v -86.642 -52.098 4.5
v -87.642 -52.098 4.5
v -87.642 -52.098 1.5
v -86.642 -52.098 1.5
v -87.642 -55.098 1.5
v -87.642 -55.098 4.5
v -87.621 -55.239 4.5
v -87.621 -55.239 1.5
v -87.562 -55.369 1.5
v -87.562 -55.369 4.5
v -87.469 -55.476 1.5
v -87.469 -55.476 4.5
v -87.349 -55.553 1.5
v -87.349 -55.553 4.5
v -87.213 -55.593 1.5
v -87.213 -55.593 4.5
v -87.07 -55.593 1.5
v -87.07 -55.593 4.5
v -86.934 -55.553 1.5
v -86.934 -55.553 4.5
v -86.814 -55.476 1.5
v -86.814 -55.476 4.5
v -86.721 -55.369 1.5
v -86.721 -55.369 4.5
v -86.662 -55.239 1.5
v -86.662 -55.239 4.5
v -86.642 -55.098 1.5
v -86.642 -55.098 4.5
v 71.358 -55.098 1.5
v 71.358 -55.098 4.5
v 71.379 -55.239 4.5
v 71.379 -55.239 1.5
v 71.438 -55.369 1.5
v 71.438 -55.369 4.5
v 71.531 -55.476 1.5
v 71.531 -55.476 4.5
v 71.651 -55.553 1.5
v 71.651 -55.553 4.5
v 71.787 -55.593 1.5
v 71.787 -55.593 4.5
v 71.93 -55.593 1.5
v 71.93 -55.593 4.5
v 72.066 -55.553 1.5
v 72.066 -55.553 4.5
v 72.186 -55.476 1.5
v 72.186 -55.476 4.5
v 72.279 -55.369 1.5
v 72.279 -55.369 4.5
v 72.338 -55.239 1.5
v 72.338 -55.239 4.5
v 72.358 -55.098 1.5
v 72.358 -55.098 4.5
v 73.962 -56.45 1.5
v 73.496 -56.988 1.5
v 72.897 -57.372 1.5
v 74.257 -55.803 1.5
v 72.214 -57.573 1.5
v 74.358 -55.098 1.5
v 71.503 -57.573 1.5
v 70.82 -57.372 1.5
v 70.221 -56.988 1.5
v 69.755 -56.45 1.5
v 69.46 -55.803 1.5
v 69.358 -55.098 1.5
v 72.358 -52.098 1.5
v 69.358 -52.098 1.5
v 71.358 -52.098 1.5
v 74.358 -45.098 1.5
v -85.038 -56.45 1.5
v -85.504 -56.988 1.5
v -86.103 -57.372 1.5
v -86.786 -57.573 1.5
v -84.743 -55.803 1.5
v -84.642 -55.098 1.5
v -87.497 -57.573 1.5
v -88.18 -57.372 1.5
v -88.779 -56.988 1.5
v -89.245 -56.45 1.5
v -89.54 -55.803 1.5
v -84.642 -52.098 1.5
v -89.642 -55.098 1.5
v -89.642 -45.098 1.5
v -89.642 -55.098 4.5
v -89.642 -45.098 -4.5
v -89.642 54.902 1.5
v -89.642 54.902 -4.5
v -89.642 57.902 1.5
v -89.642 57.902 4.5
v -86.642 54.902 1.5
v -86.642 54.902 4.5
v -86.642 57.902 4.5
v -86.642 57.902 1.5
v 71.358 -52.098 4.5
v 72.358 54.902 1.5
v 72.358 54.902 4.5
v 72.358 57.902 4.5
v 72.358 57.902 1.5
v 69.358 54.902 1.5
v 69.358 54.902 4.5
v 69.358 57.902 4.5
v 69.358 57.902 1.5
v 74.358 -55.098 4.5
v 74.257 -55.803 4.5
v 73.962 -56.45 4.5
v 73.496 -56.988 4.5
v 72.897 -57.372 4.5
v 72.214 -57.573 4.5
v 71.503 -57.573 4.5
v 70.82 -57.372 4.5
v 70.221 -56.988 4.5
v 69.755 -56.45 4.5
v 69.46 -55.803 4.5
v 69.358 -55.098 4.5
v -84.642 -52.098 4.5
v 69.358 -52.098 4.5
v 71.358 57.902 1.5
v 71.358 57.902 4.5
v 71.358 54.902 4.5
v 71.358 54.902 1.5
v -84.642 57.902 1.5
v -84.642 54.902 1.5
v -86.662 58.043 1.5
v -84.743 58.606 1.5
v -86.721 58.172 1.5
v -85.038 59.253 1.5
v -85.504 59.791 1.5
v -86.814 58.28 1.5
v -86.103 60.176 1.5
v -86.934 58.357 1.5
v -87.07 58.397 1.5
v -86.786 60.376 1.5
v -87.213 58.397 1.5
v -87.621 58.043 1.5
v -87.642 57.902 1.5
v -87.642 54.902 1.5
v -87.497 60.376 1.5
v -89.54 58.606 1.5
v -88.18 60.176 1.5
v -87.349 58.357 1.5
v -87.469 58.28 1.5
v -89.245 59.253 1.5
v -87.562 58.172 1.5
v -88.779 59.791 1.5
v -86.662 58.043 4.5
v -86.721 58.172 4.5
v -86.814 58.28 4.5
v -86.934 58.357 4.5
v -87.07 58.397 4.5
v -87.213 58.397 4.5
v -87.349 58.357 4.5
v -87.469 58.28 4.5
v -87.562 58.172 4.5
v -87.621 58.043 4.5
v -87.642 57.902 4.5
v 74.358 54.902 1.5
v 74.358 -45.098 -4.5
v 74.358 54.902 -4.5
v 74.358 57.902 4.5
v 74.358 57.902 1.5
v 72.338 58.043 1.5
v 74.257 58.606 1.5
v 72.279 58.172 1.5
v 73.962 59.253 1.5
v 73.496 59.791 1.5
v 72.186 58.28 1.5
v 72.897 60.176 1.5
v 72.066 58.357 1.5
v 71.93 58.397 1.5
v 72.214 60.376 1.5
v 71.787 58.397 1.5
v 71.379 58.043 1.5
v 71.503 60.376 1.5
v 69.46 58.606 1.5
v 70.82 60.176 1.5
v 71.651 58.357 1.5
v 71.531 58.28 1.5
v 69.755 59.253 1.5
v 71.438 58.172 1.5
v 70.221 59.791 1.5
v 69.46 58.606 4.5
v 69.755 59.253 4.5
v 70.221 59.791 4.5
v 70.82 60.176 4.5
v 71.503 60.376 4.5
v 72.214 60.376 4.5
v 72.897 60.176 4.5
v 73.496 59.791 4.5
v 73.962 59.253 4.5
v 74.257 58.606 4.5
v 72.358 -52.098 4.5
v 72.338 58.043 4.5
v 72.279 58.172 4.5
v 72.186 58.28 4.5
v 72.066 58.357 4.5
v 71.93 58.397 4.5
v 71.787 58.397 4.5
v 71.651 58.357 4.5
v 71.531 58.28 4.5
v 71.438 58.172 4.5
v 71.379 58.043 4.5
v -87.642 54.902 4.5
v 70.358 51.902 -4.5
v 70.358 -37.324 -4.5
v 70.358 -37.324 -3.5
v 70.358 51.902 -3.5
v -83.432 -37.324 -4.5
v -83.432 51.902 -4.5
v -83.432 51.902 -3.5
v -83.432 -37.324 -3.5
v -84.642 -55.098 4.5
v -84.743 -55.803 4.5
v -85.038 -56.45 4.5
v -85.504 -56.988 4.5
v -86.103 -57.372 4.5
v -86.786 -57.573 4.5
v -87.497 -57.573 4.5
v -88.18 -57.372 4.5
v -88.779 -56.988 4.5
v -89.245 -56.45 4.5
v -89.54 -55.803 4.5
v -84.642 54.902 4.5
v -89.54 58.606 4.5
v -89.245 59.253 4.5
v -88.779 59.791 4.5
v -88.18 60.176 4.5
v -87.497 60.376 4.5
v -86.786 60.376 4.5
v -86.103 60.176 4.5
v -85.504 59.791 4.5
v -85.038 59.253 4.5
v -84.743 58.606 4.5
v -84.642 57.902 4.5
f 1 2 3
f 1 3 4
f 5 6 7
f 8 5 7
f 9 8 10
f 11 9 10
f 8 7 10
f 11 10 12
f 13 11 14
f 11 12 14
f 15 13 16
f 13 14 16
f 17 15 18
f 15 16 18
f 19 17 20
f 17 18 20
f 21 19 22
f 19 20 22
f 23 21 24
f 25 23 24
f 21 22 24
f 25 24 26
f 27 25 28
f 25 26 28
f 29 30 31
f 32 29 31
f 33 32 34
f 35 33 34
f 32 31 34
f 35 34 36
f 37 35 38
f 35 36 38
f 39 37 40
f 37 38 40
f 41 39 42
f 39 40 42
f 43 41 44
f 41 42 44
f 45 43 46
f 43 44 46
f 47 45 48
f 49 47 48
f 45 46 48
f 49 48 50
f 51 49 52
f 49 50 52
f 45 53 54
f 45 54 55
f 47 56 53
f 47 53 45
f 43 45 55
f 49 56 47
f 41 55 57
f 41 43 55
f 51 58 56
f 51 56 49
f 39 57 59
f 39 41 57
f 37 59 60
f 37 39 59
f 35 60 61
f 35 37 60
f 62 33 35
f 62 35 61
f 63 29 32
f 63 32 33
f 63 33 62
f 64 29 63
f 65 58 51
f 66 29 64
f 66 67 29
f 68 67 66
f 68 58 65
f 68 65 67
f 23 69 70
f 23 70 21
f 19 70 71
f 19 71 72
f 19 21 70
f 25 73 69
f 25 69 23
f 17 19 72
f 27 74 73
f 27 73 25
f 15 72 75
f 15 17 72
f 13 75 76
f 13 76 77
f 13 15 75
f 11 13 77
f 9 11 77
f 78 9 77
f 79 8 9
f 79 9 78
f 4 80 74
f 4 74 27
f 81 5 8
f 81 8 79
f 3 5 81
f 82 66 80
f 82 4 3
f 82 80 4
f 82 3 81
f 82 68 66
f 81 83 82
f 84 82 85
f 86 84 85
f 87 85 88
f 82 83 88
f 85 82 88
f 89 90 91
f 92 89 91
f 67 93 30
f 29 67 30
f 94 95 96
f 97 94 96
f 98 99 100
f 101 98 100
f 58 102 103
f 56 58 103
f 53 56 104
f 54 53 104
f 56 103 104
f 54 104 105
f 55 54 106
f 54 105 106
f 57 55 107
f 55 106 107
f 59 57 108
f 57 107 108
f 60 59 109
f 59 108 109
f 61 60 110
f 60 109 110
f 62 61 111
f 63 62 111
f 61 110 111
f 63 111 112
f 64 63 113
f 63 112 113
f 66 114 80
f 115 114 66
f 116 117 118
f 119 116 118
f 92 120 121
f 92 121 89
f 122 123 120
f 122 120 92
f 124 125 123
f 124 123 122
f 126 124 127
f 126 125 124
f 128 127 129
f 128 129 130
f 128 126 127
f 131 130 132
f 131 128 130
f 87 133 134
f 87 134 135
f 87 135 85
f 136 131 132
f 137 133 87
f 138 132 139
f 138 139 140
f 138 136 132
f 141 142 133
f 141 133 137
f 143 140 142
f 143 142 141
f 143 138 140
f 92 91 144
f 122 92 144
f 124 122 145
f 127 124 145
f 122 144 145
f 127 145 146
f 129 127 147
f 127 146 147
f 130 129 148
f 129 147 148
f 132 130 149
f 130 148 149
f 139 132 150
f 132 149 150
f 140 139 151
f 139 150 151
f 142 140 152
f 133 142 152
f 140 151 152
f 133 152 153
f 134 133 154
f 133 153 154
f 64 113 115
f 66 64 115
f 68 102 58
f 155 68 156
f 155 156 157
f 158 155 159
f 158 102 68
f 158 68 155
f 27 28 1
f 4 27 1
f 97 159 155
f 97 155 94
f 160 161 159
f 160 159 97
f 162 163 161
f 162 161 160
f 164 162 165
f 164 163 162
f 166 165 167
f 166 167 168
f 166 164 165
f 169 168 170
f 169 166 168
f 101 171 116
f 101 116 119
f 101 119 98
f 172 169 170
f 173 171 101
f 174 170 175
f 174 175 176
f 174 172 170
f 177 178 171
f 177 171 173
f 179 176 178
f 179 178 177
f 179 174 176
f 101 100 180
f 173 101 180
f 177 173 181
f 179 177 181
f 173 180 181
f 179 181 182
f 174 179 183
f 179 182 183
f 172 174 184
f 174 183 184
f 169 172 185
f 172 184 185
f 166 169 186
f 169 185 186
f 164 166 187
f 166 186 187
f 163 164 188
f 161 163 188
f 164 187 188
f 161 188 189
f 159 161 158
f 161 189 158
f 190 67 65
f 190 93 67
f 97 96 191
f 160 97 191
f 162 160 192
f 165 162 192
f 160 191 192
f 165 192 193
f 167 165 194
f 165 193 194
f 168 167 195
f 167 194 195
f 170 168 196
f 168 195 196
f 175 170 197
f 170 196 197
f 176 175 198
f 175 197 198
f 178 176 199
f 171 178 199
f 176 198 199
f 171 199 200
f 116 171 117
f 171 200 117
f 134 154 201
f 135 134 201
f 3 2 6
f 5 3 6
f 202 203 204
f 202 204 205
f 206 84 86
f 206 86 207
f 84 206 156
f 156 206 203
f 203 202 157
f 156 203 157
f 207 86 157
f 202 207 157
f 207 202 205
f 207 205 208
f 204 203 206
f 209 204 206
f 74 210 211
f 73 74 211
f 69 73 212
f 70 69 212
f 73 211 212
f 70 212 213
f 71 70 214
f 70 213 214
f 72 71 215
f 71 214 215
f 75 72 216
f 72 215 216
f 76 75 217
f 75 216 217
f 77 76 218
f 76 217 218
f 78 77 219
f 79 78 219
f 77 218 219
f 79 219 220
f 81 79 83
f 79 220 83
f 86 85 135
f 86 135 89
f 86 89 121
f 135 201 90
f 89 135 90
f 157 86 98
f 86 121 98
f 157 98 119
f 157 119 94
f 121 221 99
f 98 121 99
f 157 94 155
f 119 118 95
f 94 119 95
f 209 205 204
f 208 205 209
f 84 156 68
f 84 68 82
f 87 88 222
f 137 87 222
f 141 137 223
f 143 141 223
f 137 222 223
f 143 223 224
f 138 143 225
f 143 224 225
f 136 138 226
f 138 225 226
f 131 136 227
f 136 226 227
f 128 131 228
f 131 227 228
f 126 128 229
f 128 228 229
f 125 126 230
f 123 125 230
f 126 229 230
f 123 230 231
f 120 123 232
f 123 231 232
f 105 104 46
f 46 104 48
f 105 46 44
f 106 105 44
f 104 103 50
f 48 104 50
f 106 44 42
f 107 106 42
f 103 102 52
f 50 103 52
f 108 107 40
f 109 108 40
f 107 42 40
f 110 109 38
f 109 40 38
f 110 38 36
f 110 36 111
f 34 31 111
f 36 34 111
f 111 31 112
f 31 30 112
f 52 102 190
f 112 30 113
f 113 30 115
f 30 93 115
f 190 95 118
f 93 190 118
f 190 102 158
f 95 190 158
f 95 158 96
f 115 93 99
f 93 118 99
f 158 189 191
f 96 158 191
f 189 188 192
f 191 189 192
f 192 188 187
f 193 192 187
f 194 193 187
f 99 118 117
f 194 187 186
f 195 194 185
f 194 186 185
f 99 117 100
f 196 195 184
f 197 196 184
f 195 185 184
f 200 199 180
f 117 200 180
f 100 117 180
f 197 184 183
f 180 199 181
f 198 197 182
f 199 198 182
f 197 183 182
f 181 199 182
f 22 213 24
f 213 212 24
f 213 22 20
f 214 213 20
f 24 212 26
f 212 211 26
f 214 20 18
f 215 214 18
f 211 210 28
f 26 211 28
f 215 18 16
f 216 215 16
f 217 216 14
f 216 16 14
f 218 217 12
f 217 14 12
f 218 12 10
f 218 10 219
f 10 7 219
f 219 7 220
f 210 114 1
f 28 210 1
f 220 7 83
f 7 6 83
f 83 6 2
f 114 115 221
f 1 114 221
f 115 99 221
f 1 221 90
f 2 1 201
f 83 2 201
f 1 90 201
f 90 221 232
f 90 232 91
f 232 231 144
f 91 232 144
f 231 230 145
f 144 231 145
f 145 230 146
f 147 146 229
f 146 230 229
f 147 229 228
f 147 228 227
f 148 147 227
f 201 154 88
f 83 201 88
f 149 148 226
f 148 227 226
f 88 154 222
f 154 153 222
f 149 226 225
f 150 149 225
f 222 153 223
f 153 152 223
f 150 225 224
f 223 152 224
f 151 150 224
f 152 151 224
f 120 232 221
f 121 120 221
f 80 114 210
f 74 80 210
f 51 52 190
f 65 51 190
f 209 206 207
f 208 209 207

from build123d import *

# Parameters (mm, degrees)
ESBO_O1_W                = 164
ESBO_O1_H                = 107
RESSALTO_EXTRUS_O1_DEPTH = 4.5
EXTRUS_O_FINA2_DEPTH     = 3
ESBO_O3_W                = 164
ESBO_O3_H                = 7
CORTE_EXTRUS_O1_DEPTH    = 6
ESBO_O5_W                = 153.790549152
ESBO_O5_H                = 89.226156431
CORTE_EXTRUS_O2_DEPTH    = 1


with BuildPart() as part:
    # Esboço1 → Ressalto-extrusão1 (new, symmetric)
    with BuildSketch(Plane.XY):
        with Locations((-7.64158605, 1.401746725)):
            Rectangle(ESBO_O1_W, ESBO_O1_H)
    extrude(amount=RESSALTO_EXTRUS_O1_DEPTH, both=True)

    # Esboço2 → Extrusão-Fina2 (add)
    with BuildSketch(Plane.XY.offset(4.5)):
        with BuildLine():
            Line((-89.64158605, 54.901746725), (-89.64158605, 57.901746725))
            ThreePointArc((-89.64158605, 57.901746725), (-87.14158605, 60.401746725), (-84.64158605, 57.901746725))
            Line((-84.64158605, 57.901746725), (-84.64158605, 54.901746725))
            Line((-84.64158605, 54.901746725), (-86.64158605, 54.901746725))
            Line((-86.64158605, 54.901746725), (-86.64158605, 57.901746725))
            ThreePointArc((-86.64158605, 57.901746725), (-87.14158605, 58.401746725), (-87.64158605, 57.901746725))
            Line((-87.64158605, 57.901746725), (-87.64158605, 54.901746725))
            Line((-87.64158605, 54.901746725), (-89.64158605, 54.901746725))
        make_face()
        with BuildLine():
            Line((69.35841395, 54.901746725), (69.35841395, 57.901746725))
            ThreePointArc((69.35841395, 57.901746725), (71.85841395, 60.401746725), (74.35841395, 57.901746725))
            Line((74.35841395, 57.901746725), (74.35841395, 54.901746725))
            Line((74.35841395, 54.901746725), (72.35841395, 54.901746725))
            Line((72.35841395, 54.901746725), (72.35841395, 57.901746725))
            ThreePointArc((72.35841395, 57.901746725), (71.85841395, 58.401746725), (71.35841395, 57.901746725))
            Line((71.35841395, 57.901746725), (71.35841395, 54.901746725))
            Line((71.35841395, 54.901746725), (69.35841395, 54.901746725))
        make_face()
        with BuildLine():
            Line((-84.64158605, -52.098253275), (-84.64158605, -55.098253275))
            ThreePointArc((-84.64158605, -55.098253275), (-87.14158605, -57.598253275), (-89.64158605, -55.098253275))
            Line((-89.64158605, -55.098253275), (-89.64158605, -52.098253275))
            Line((-89.64158605, -52.098253275), (-87.64158605, -52.098253275))
            Line((-87.64158605, -52.098253275), (-87.64158605, -55.098253275))
            ThreePointArc((-87.64158605, -55.098253275), (-87.14158605, -55.598253275), (-86.64158605, -55.098253275))
            Line((-86.64158605, -55.098253275), (-86.64158605, -52.098253275))
            Line((-86.64158605, -52.098253275), (-84.64158605, -52.098253275))
        make_face()
        with BuildLine():
            Line((74.35841395, -52.098253275), (74.35841395, -55.098253275))
            ThreePointArc((74.35841395, -55.098253275), (71.85841395, -57.598253275), (69.35841395, -55.098253275))
            Line((69.35841395, -55.098253275), (69.35841395, -52.098253275))
            Line((69.35841395, -52.098253275), (71.35841395, -52.098253275))
            Line((71.35841395, -52.098253275), (71.35841395, -55.098253275))
            ThreePointArc((71.35841395, -55.098253275), (71.85841395, -55.598253275), (72.35841395, -55.098253275))
            Line((72.35841395, -55.098253275), (72.35841395, -52.098253275))
            Line((72.35841395, -52.098253275), (74.35841395, -52.098253275))
        make_face()
    extrude(amount=-EXTRUS_O_FINA2_DEPTH)

    # Esboço3 → Corte-extrusão1 (cut)
    with BuildSketch(Plane(origin=(0, 0, -4.5), x_dir=(-1, 0, 0), z_dir=(0, 0, -1))):
        with Locations((7.64158605, -48.598253275)):
            Rectangle(ESBO_O3_W, ESBO_O3_H)
    extrude(amount=-CORTE_EXTRUS_O1_DEPTH, mode=Mode.SUBTRACT)

    # Esboço5 → Corte-extrusão2 (cut)
    with BuildSketch(Plane(origin=(0, 0, -4.5), x_dir=(-1, 0, 0), z_dir=(0, 0, -1))):
        with Locations((6.536860626, 7.288668509)):
            Rectangle(ESBO_O5_W, ESBO_O5_H)
    extrude(amount=-CORTE_EXTRUS_O2_DEPTH, mode=Mode.SUBTRACT)


solid = part.part
